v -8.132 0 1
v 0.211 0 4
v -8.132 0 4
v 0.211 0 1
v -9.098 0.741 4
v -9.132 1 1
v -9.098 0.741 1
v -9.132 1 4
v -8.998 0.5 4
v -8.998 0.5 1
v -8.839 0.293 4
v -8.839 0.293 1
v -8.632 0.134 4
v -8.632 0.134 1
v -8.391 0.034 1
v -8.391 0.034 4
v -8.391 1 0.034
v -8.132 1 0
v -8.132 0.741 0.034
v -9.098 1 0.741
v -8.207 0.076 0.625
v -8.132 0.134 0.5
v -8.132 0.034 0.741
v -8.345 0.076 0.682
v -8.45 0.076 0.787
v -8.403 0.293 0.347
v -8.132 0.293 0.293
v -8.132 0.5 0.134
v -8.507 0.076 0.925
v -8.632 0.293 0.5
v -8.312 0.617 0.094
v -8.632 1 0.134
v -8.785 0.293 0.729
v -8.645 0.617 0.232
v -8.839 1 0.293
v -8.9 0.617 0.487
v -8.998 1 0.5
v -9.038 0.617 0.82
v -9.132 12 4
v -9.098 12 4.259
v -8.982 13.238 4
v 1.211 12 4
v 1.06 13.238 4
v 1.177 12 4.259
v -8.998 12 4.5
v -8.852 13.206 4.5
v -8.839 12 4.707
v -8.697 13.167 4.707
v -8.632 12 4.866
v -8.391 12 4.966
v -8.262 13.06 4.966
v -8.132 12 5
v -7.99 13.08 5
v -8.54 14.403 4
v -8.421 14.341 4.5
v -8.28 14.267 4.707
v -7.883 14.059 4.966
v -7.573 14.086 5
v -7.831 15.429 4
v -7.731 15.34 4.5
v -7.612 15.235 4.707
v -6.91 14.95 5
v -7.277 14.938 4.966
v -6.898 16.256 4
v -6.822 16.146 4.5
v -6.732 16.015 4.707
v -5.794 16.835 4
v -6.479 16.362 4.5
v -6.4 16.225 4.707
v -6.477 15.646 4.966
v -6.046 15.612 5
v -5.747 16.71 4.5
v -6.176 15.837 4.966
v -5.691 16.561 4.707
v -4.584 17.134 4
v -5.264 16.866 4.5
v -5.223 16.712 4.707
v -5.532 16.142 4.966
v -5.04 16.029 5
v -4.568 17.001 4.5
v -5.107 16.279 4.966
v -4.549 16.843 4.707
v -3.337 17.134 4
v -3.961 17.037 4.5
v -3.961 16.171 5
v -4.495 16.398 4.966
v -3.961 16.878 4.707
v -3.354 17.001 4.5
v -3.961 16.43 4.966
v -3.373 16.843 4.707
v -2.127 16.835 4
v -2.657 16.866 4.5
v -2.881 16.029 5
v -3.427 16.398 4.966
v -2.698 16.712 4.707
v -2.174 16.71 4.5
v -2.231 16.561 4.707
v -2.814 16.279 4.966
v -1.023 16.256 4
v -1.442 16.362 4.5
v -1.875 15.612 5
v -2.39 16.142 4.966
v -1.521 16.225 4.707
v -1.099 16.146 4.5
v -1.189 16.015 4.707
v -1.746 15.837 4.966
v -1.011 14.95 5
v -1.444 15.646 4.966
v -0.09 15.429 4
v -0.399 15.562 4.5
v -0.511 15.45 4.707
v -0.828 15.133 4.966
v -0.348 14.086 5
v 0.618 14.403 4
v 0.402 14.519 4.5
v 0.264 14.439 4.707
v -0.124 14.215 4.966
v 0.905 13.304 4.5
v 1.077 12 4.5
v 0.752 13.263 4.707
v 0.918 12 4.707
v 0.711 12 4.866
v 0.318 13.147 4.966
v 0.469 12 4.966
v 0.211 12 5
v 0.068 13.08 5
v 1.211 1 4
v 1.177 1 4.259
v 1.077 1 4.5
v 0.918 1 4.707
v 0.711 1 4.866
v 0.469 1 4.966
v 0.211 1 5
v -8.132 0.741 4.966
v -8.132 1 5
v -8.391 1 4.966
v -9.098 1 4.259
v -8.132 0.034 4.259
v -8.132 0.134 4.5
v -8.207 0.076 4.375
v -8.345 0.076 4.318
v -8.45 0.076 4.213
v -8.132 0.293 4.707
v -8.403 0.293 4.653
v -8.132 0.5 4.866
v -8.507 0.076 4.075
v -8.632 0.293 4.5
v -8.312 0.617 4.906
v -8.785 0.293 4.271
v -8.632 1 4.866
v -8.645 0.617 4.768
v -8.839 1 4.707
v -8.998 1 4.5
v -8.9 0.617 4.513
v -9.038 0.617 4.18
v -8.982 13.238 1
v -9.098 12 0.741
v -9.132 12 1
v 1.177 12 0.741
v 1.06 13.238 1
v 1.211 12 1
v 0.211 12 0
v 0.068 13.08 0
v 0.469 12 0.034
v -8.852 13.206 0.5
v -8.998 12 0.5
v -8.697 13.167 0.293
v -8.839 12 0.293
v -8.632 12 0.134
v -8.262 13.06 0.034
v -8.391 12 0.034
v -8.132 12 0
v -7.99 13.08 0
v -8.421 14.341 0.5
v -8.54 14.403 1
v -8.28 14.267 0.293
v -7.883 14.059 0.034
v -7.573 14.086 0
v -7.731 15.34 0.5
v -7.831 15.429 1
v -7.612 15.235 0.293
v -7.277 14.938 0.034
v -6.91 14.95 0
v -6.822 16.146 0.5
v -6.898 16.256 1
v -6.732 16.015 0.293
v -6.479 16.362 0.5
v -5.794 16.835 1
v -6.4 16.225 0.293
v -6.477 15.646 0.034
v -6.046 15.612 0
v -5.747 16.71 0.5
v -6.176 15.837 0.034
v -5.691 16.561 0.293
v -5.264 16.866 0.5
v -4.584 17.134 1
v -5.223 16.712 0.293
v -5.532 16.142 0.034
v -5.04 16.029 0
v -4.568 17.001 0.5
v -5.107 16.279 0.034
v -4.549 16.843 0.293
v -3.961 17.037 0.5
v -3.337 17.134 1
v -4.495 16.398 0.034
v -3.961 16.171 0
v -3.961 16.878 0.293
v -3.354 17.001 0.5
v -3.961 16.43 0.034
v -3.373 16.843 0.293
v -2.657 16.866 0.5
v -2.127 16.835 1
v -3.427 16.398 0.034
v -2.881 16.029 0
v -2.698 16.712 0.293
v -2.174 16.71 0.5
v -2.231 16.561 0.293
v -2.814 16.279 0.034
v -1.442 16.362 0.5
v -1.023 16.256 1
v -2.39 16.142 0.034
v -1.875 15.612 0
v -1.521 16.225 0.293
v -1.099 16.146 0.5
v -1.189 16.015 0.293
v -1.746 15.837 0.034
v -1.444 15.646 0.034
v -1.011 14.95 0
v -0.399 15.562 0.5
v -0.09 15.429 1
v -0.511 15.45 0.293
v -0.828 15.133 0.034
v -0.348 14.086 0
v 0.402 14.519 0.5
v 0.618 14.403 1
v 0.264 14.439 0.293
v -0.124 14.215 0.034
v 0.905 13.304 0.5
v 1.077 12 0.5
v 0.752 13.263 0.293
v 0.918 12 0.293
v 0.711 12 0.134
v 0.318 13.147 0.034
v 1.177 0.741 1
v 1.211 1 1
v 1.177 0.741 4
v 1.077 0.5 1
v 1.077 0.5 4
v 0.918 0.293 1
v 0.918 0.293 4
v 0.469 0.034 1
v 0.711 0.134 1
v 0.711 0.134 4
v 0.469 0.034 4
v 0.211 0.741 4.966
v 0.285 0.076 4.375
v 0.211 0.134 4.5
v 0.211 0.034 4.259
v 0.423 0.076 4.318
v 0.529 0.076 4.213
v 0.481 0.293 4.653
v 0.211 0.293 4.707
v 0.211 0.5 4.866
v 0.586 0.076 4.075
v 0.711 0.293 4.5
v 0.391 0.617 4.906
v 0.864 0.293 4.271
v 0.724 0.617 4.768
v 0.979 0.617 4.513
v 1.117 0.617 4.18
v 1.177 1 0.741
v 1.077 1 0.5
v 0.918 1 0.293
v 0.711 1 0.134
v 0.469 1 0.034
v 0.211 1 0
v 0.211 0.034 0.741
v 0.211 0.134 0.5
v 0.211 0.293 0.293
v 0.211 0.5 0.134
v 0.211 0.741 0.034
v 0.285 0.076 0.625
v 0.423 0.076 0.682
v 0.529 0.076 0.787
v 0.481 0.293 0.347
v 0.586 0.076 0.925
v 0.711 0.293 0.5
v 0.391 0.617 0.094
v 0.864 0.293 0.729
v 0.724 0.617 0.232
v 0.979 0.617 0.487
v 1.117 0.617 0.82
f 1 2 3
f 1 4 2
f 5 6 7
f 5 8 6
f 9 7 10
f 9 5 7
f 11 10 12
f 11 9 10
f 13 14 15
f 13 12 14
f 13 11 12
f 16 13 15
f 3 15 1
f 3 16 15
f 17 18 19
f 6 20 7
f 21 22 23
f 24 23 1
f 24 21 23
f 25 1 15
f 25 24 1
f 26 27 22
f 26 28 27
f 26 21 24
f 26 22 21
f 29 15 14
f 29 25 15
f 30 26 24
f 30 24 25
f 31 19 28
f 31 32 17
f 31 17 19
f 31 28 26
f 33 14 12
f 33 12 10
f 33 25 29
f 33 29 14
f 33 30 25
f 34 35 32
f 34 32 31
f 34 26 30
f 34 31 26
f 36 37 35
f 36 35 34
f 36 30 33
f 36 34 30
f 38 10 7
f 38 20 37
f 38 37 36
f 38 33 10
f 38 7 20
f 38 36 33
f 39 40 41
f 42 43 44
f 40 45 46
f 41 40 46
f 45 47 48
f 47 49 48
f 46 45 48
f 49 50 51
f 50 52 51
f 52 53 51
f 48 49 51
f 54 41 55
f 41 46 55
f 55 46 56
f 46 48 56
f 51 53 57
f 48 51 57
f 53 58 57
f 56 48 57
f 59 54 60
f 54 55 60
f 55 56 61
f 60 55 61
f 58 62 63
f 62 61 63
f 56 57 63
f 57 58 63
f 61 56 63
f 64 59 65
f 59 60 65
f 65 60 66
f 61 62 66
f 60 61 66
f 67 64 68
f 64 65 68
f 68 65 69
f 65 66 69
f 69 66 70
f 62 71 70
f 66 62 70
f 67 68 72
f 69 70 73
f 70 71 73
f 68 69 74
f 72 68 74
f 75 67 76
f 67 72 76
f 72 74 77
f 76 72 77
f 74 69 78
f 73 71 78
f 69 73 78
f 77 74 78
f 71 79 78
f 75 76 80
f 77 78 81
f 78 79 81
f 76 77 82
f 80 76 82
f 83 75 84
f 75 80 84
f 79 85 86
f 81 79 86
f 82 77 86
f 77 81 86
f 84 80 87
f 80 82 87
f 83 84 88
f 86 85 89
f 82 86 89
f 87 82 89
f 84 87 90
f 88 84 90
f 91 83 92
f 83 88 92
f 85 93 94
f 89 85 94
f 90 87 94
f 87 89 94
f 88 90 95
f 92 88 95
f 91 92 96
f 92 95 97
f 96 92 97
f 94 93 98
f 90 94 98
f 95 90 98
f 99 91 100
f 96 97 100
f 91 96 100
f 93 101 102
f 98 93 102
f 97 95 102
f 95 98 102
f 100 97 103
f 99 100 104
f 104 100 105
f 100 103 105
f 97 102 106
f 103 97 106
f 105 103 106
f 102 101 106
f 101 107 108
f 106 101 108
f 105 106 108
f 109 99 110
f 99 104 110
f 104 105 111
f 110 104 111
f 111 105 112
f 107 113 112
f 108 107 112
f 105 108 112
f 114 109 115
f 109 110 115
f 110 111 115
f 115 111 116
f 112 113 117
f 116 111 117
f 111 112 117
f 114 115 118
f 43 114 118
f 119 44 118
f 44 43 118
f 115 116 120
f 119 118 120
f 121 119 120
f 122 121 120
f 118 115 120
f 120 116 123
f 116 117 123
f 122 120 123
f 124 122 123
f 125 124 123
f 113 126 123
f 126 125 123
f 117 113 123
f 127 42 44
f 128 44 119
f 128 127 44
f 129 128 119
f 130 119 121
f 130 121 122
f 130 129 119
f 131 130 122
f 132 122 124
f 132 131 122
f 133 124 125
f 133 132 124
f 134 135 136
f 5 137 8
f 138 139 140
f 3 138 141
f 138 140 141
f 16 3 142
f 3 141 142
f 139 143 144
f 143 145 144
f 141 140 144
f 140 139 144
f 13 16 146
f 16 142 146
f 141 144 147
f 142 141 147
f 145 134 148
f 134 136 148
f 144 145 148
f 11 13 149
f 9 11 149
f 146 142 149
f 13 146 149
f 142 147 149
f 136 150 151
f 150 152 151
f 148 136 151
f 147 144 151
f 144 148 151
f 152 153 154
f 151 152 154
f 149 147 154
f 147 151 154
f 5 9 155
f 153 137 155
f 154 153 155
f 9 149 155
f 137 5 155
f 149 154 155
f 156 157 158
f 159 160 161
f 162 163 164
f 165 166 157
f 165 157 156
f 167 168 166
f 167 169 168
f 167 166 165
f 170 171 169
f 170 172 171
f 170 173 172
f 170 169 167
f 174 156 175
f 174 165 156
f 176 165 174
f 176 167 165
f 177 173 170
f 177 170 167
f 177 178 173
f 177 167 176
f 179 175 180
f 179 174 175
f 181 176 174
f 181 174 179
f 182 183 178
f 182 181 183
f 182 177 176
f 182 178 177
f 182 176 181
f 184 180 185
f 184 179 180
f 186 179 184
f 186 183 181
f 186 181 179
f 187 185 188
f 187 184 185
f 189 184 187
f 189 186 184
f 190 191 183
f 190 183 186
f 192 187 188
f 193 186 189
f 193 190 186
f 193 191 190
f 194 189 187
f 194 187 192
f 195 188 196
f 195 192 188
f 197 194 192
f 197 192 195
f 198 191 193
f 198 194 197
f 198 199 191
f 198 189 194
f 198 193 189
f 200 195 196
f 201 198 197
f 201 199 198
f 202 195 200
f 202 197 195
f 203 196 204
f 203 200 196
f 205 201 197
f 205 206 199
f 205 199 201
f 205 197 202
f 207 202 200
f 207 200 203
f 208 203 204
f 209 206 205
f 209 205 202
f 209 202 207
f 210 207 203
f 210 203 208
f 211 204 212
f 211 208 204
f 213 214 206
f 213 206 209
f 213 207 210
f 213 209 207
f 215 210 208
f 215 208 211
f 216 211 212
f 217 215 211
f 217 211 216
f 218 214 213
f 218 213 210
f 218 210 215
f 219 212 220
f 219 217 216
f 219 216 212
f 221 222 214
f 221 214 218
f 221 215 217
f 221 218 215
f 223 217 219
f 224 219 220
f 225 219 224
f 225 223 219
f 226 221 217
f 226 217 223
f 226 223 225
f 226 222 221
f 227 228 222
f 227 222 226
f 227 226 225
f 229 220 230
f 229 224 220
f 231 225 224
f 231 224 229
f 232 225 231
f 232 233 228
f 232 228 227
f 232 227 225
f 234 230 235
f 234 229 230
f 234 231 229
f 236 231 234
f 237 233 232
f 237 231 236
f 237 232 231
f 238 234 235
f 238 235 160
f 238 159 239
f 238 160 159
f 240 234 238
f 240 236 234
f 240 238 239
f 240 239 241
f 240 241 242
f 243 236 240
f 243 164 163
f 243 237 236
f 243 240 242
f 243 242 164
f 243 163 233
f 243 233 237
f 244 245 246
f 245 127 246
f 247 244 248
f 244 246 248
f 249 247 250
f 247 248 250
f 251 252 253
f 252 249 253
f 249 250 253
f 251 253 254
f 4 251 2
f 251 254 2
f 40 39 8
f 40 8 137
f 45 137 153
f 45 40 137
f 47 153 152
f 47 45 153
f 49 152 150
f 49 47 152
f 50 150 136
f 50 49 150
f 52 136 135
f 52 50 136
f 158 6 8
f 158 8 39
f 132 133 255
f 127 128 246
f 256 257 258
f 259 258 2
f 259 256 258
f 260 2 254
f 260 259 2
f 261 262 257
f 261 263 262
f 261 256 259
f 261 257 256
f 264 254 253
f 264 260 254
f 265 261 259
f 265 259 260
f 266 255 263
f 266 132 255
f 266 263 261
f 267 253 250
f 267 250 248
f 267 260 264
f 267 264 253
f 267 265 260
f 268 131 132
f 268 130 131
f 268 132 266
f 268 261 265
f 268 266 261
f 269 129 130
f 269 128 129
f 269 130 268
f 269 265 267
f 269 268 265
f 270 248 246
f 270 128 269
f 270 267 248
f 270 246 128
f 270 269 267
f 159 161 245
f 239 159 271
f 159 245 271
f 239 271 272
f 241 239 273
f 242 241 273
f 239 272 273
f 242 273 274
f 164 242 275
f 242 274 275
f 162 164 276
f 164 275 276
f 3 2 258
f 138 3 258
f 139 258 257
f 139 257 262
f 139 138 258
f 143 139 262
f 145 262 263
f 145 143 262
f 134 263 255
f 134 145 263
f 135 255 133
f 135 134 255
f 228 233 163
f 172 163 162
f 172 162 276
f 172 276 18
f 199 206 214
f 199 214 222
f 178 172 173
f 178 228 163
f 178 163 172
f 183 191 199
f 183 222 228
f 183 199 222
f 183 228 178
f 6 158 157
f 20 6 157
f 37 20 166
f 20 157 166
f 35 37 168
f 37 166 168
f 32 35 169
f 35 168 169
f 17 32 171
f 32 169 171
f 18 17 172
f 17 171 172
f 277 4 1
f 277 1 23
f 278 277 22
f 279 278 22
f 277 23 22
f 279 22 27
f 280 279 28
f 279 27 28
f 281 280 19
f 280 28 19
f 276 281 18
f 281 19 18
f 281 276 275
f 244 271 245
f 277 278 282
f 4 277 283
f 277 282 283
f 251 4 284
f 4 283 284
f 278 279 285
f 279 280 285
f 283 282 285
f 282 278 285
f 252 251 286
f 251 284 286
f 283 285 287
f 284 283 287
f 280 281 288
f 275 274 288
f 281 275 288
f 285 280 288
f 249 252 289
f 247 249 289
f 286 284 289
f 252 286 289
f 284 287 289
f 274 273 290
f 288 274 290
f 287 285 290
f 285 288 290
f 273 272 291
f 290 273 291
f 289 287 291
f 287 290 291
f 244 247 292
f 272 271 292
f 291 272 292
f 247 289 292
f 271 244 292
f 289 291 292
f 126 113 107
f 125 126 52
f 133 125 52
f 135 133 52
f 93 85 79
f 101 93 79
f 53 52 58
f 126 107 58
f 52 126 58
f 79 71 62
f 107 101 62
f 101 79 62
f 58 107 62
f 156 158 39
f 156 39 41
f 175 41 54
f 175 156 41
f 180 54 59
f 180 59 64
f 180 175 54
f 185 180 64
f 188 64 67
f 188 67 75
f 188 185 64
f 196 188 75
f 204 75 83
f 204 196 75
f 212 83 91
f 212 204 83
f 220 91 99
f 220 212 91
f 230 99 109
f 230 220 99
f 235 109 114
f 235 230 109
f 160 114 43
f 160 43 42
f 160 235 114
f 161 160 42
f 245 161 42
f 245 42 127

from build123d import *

# Parameters (mm, degrees)
BOSS_EXTRUDE1_DEPTH = 5
FILLET2_R           = 1


with BuildPart() as part:
    # Sketch1 → Boss-Extrude1 (new body)
    with BuildSketch(Plane.XY):
        with BuildLine():
            Line((-9.132007365, 0), (-9.132007365, 12))
            ThreePointArc((-9.132007365, 12), (-3.960686979, 17.171320386), (1.210633407, 12))
            Line((1.210633407, 12), (1.210633407, 0))
            Line((1.210633407, 0), (-9.132007365, 0))
        make_face()
    extrude(amount=BOSS_EXTRUDE1_DEPTH)

    # Fillet2
    fillet2_edges = [part.edges().sort_by_distance(p)[0] for p in [
        (-3.960686979, 17.171320386, 5),
        (-9.132007365, 6, 5),
        (-3.960686979, 0, 5),
        (-9.132007365, 6, 0),
        (-3.960686979, 17.171320386, 0),
        (1.210633407, 6, 0),
        (-3.960686979, 0, 0),
        (1.210633407, 6, 5),
        (-9.132007365, 0, 2.5),
        (1.210633407, 0, 2.5),
    ]]
    fillet(fillet2_edges, radius=FILLET2_R)


solid = part.part
